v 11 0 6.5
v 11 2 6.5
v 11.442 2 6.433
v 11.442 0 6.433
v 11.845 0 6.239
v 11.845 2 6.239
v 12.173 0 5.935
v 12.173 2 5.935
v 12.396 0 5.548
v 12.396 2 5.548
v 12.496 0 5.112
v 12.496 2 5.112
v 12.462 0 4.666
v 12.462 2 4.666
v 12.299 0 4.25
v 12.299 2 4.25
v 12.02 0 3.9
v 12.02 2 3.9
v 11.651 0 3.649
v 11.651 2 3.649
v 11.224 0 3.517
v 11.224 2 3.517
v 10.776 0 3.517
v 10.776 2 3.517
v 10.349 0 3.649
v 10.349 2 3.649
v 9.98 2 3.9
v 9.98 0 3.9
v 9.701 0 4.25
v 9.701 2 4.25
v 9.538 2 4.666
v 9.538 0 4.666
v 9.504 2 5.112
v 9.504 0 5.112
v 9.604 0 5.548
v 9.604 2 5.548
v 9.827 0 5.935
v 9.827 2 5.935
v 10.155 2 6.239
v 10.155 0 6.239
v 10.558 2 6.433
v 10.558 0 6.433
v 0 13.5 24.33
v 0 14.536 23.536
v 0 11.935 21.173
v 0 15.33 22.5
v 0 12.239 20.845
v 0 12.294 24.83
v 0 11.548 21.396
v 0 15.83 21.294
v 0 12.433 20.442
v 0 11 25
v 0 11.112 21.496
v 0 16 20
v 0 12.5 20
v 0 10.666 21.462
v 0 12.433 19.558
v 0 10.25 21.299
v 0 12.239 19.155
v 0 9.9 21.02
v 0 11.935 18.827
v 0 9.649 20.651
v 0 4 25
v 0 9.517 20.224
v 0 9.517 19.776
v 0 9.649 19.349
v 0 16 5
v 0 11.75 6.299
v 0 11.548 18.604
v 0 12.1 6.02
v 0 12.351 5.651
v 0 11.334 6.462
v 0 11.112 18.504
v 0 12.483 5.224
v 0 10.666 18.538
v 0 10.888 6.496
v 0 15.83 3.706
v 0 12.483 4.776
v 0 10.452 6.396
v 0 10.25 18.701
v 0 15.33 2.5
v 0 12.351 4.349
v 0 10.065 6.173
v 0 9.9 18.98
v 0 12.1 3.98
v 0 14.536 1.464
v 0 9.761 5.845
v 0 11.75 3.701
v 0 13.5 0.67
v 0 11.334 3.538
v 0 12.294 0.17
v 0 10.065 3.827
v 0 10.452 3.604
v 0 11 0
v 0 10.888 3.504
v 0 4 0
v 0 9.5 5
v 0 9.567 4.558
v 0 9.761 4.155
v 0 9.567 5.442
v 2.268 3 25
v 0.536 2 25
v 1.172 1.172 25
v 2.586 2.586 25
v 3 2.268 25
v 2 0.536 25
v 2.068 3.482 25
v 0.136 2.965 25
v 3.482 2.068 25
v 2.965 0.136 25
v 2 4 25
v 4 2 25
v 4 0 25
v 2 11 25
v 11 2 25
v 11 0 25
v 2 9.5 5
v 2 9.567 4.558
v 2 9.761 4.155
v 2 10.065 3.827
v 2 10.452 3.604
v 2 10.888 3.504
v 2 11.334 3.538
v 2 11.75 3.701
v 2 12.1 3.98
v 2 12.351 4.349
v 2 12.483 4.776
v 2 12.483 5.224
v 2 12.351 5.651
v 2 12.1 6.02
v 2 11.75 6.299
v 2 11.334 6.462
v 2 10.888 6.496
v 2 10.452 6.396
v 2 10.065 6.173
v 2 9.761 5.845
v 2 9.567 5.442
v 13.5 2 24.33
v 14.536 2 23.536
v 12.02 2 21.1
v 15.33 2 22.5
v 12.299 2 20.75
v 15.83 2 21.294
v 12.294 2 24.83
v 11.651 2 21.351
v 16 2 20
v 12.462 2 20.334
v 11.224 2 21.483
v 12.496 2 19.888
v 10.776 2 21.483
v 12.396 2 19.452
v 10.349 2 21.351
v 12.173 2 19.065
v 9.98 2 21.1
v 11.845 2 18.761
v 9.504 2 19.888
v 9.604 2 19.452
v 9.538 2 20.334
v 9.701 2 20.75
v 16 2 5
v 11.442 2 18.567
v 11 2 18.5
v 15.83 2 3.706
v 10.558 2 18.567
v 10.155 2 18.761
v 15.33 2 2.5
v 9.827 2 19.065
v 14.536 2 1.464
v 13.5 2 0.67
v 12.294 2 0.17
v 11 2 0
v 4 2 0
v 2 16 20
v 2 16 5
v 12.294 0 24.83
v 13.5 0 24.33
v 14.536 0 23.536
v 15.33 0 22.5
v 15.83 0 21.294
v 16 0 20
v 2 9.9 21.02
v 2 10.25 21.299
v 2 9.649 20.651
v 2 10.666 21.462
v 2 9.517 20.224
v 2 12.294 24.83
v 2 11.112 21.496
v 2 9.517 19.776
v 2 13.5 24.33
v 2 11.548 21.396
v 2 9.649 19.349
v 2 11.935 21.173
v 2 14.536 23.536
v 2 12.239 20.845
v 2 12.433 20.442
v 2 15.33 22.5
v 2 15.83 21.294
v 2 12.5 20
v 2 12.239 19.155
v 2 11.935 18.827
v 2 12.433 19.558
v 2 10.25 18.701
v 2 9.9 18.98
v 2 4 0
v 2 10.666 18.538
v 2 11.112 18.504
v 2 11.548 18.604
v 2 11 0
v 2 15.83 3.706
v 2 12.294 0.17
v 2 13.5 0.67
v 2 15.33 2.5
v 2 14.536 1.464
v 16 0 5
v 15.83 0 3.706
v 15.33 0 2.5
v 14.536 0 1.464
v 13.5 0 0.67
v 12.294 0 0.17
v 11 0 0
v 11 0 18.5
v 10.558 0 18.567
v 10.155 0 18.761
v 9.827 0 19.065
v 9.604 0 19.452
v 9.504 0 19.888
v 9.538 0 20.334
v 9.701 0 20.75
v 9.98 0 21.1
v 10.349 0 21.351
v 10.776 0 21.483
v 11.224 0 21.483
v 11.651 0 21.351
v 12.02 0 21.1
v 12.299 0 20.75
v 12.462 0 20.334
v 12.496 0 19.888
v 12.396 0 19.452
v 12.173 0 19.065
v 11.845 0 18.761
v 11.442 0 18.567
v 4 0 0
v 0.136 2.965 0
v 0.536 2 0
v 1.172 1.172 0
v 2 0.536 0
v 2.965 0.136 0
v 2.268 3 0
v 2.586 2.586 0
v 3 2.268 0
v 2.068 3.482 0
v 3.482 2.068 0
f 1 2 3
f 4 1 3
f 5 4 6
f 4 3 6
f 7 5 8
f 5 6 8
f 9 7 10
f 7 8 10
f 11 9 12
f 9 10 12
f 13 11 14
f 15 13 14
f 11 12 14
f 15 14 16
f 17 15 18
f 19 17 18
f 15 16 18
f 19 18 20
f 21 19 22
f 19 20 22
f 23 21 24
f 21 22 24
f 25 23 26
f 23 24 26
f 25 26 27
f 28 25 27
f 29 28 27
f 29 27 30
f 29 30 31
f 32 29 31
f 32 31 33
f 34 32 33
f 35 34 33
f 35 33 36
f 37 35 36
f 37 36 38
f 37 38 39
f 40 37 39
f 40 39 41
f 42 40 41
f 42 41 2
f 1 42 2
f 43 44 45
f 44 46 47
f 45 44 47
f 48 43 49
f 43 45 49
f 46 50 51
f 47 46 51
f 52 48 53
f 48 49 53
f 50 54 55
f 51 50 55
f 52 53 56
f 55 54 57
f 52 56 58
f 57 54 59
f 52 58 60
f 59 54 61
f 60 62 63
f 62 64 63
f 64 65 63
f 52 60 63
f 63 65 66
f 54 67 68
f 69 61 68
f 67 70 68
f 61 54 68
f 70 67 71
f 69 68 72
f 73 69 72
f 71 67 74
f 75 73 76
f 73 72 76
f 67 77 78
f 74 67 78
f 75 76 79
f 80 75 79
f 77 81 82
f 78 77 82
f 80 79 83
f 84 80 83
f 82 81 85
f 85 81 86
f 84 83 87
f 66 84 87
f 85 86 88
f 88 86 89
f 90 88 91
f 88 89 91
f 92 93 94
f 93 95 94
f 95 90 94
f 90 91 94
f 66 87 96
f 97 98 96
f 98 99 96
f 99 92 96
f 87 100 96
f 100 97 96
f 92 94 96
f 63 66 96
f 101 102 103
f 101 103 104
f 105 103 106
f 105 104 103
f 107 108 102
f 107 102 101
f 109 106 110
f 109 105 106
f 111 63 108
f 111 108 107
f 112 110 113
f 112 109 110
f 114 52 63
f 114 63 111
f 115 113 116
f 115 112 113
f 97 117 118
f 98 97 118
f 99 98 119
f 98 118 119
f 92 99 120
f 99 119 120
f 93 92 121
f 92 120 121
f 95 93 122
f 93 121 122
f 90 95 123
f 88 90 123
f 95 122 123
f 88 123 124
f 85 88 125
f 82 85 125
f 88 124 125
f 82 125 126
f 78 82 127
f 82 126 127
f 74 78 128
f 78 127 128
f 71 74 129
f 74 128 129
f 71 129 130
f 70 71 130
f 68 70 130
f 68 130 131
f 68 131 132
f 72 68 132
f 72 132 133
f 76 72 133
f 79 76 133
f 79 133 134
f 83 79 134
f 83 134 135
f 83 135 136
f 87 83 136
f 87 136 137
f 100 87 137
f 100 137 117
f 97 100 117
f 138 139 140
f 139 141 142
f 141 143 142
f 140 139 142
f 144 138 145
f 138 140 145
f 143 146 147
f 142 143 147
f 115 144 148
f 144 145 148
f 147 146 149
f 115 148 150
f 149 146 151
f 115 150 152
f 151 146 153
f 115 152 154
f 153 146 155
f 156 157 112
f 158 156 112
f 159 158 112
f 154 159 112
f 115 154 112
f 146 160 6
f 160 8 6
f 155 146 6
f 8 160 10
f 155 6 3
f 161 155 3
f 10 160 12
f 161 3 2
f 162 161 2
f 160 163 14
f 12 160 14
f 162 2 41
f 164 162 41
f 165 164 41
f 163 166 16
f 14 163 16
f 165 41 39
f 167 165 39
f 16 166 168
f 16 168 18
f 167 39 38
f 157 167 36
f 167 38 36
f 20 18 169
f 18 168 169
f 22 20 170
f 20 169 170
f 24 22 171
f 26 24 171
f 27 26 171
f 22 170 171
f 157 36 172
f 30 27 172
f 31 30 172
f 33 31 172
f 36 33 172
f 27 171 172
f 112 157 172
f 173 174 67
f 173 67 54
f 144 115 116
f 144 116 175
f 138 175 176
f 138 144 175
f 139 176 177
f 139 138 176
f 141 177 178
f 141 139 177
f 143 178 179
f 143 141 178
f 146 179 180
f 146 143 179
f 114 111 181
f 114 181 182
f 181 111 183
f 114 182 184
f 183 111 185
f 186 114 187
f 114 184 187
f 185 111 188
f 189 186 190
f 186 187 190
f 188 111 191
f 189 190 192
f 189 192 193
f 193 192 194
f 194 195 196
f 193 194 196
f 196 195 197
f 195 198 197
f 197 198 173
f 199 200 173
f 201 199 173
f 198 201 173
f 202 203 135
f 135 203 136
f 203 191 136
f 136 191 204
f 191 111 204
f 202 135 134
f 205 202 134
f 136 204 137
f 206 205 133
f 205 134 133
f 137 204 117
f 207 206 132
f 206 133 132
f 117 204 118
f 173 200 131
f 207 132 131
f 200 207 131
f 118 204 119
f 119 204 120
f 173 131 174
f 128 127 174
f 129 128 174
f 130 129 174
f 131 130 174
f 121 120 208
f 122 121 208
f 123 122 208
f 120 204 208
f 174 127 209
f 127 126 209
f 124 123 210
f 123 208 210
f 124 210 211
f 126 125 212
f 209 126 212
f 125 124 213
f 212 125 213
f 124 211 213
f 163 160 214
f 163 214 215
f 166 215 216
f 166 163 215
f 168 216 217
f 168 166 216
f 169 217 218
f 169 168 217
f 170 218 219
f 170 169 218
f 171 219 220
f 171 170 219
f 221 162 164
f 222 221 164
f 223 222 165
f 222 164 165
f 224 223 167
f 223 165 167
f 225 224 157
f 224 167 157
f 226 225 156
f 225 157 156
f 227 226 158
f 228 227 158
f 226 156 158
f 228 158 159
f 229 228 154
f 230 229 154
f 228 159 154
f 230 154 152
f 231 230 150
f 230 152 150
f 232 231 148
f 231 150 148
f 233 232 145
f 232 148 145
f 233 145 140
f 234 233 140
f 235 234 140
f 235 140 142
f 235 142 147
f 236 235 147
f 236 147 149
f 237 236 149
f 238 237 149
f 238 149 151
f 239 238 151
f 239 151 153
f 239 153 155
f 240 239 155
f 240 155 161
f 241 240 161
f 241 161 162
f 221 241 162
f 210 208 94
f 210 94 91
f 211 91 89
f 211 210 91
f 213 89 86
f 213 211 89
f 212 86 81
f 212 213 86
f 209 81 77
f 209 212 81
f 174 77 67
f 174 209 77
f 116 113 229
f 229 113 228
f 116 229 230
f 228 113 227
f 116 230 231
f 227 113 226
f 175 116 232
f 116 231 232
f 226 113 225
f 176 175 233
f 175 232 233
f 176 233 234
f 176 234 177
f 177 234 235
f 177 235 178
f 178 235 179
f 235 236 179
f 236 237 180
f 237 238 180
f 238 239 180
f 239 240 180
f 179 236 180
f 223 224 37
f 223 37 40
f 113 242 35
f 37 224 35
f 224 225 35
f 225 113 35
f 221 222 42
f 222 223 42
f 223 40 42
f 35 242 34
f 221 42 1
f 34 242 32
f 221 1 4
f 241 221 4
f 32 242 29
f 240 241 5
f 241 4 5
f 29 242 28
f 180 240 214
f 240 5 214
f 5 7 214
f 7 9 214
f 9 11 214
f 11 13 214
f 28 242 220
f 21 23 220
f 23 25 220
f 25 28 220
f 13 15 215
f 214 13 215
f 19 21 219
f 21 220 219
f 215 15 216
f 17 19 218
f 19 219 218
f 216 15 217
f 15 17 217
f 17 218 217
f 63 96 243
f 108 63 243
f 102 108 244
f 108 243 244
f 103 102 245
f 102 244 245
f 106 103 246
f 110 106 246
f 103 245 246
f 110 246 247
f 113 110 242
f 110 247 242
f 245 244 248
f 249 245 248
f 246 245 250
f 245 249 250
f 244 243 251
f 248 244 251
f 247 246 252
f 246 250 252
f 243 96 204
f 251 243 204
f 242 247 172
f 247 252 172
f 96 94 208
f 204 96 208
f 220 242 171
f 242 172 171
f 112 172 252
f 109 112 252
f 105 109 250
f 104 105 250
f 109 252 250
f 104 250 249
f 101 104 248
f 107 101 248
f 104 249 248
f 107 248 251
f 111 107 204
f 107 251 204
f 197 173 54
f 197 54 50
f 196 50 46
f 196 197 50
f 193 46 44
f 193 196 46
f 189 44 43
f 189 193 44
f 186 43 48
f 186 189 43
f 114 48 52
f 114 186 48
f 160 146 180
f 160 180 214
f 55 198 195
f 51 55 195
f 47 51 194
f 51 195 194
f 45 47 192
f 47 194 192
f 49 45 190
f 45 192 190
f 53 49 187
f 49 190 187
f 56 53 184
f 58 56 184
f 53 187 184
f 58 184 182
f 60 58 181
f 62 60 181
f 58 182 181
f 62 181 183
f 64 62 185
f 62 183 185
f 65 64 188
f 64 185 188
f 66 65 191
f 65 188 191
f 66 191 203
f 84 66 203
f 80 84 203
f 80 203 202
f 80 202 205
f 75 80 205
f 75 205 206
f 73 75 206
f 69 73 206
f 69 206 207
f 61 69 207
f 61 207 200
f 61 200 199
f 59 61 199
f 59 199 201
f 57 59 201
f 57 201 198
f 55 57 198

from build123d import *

# Parameters (mm, degrees)
SM_BASE_FLANGE_1_DEPTH = 25
SKETCH_6_R             = 1.5
CUT_EXTRUDE_1_DEPTH    = 37.728735344
SKETCH_7_R             = 1.5
CUT_EXTRUDE_2_DEPTH    = 35.942810419


# Sheet-metal steps are written as plain solids
with BuildPart() as part:
    # Sketch 1 → 基体-法兰1 (new body)
    with BuildSketch(Plane.XY):
        with BuildLine():
            Line((0, 20), (0, 4))
            ThreePointArc((0, 4), (1.171572875, 1.171572875), (4, 0))
            Line((4, 0), (20, 0))
            Line((20, 0), (20, 2))
            Line((20, 2), (4, 2))
            ThreePointArc((4, 2), (2.585786438, 2.585786438), (2, 4))
            Line((2, 4), (2, 20))
            Line((2, 20), (0, 20))
        make_face()
    extrude(amount=SM_BASE_FLANGE_1_DEPTH)

    # 草图6 → 切除-拉伸1 (cut, through all)
    with BuildSketch(Plane(origin=(0, 2, 0), x_dir=(1, 0, 0), z_dir=(0, 1, 0))):
        with Locations(Location((11, -5, 0), (0, 0, 270))):
            Circle(SKETCH_6_R)
        with Locations(Location((11, -20, 0), (0, 0, 90))):
            Circle(SKETCH_6_R)
        with BuildLine():
            Line((11, 0), (33.790991845, 0))
            Line((33.790991845, 0), (33.790991845, -25))
            Line((33.790991845, -25), (11, -25))
            ThreePointArc((11, -25), (14.535533906, -23.535533906), (16, -20))
            Line((16, -20), (16, -5))
            ThreePointArc((16, -5), (14.535533906, -1.464466094), (11, 0))
        make_face()
    extrude(amount=-CUT_EXTRUDE_1_DEPTH, mode=Mode.SUBTRACT)

    # 草图7 → 切除-拉伸2 (cut, through all)
    with BuildSketch(Plane(origin=(2, 0, 0), x_dir=(0, 0, -1), z_dir=(1, 0, 0))):
        with Locations(Location((-20, 11, 0), (0, 0, 90))):
            Circle(SKETCH_7_R)
        with Locations(Location((-5, 11, 0), (0, 0, 270))):
            Circle(SKETCH_7_R)
        with BuildLine():
            Line((-25, 11), (-25, 23.177465953))
            Line((-25, 23.177465953), (0, 23.177465953))
            Line((0, 23.177465953), (0, 11))
            ThreePointArc((0, 11), (-1.464466094, 14.535533906), (-5, 16))
            Line((-5, 16), (-20, 16))
            ThreePointArc((-20, 16), (-23.535533906, 14.535533906), (-25, 11))
        make_face()
    extrude(amount=-CUT_EXTRUDE_2_DEPTH, mode=Mode.SUBTRACT)


solid = part.part
